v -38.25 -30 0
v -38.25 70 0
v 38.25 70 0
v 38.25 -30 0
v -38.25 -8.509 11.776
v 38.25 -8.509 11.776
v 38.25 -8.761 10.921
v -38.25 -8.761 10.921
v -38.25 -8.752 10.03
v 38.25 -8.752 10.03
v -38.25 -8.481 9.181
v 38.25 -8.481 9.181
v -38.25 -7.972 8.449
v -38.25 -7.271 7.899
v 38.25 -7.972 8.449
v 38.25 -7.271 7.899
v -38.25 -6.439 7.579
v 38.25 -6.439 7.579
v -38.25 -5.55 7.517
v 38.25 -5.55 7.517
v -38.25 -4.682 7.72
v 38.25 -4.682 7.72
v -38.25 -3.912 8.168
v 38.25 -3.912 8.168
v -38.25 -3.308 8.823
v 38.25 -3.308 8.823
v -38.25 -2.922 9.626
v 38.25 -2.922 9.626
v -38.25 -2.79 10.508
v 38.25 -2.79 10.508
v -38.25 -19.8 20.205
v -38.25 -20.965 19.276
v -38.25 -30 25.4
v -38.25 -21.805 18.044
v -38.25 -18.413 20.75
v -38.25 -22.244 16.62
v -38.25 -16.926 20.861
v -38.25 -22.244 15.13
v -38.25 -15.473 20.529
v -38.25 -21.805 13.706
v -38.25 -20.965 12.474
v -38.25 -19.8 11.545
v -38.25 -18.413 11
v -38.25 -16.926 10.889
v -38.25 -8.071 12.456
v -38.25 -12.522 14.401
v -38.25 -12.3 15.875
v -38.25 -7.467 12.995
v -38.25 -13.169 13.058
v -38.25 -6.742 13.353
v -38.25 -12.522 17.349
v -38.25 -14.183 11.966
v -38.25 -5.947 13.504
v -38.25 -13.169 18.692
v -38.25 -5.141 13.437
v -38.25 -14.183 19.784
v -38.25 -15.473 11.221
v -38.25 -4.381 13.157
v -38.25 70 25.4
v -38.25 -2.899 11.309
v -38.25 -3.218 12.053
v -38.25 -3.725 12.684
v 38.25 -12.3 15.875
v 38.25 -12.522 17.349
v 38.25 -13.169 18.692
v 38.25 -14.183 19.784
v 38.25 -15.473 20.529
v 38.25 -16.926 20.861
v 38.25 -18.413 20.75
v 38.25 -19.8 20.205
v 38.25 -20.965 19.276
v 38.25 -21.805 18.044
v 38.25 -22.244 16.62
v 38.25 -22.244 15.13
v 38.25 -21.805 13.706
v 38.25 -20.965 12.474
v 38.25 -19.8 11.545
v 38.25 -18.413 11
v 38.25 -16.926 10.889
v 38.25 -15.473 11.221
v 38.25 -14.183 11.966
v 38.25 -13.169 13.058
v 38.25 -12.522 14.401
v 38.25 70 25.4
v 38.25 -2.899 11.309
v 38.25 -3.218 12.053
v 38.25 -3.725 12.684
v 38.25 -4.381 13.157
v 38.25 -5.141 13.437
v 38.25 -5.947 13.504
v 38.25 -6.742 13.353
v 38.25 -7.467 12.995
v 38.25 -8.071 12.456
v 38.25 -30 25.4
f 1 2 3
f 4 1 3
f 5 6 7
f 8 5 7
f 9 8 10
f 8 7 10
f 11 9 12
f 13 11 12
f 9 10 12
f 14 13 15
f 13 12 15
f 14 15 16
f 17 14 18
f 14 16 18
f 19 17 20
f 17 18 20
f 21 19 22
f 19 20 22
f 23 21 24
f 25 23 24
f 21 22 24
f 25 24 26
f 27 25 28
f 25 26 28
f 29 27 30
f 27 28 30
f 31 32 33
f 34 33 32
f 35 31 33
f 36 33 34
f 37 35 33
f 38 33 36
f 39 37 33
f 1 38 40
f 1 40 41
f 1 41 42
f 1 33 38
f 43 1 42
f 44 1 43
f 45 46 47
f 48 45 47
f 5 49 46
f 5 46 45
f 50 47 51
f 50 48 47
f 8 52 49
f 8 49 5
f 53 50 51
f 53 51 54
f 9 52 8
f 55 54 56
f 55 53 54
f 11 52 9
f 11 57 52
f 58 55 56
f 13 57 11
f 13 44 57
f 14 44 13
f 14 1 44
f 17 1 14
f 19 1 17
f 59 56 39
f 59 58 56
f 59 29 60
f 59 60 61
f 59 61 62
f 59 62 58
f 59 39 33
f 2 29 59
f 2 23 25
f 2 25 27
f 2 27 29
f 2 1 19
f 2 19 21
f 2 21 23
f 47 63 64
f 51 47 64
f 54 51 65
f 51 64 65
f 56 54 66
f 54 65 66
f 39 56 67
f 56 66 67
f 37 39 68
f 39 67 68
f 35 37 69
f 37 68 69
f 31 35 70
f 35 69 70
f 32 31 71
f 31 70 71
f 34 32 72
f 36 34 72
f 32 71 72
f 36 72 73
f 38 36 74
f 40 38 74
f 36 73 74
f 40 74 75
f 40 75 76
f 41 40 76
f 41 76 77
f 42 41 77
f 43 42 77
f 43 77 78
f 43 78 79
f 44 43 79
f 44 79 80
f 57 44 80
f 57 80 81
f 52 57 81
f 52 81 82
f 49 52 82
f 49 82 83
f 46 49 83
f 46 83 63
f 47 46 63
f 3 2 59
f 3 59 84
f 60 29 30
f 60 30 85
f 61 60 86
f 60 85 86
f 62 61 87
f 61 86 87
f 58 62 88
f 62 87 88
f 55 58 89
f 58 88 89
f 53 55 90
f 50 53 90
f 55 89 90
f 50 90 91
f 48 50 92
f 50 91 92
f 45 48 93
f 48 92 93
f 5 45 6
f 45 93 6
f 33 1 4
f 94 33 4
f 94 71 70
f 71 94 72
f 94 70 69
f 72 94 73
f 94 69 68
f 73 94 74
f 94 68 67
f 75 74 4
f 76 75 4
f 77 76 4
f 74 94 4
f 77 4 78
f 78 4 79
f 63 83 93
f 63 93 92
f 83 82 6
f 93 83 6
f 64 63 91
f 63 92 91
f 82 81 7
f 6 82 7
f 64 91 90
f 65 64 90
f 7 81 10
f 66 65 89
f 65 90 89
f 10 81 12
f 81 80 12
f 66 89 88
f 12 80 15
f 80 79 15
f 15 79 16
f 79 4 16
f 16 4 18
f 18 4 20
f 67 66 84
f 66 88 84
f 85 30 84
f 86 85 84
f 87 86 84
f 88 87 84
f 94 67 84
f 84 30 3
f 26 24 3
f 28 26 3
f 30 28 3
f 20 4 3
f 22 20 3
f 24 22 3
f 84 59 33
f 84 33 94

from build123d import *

# Parameters (mm, degrees)
F0_W     = 76.5
F0_H     = 100
F1_DEPTH = 25.4
F2_R     = 5
F3_DEPTH = 76.501
F5_DEPTH = 76.501


with BuildPart() as f1:
    # F0 (on Top) → F1 (new body)
    with BuildSketch(Plane.XY):
        with Locations((0, 20)):
            Rectangle(F0_W, F0_H)
    extrude(amount=F1_DEPTH)

    # F2 (on face) → F3 (cut, through all)
    with BuildSketch(Plane.YZ.offset(38.25)):
        with Locations((-17.3, 15.875)):
            Circle(F2_R)
    extrude(amount=-F3_DEPTH, mode=Mode.SUBTRACT)

    # F4 (on face) → F5 (cut, through all)
    with BuildSketch(Plane.YZ.offset(38.25)):
        with BuildLine():
            ThreePointArc((-8.508814, 11.775603), (-6.43921, 7.57886), (-2.789891, 10.507748))
            ThreePointArc((-2.789891, 10.507748), (-5.140572, 13.436636), (-8.508814, 11.775603))
        make_face()
    extrude(amount=-F5_DEPTH, mode=Mode.SUBTRACT)


solid = f1.part
